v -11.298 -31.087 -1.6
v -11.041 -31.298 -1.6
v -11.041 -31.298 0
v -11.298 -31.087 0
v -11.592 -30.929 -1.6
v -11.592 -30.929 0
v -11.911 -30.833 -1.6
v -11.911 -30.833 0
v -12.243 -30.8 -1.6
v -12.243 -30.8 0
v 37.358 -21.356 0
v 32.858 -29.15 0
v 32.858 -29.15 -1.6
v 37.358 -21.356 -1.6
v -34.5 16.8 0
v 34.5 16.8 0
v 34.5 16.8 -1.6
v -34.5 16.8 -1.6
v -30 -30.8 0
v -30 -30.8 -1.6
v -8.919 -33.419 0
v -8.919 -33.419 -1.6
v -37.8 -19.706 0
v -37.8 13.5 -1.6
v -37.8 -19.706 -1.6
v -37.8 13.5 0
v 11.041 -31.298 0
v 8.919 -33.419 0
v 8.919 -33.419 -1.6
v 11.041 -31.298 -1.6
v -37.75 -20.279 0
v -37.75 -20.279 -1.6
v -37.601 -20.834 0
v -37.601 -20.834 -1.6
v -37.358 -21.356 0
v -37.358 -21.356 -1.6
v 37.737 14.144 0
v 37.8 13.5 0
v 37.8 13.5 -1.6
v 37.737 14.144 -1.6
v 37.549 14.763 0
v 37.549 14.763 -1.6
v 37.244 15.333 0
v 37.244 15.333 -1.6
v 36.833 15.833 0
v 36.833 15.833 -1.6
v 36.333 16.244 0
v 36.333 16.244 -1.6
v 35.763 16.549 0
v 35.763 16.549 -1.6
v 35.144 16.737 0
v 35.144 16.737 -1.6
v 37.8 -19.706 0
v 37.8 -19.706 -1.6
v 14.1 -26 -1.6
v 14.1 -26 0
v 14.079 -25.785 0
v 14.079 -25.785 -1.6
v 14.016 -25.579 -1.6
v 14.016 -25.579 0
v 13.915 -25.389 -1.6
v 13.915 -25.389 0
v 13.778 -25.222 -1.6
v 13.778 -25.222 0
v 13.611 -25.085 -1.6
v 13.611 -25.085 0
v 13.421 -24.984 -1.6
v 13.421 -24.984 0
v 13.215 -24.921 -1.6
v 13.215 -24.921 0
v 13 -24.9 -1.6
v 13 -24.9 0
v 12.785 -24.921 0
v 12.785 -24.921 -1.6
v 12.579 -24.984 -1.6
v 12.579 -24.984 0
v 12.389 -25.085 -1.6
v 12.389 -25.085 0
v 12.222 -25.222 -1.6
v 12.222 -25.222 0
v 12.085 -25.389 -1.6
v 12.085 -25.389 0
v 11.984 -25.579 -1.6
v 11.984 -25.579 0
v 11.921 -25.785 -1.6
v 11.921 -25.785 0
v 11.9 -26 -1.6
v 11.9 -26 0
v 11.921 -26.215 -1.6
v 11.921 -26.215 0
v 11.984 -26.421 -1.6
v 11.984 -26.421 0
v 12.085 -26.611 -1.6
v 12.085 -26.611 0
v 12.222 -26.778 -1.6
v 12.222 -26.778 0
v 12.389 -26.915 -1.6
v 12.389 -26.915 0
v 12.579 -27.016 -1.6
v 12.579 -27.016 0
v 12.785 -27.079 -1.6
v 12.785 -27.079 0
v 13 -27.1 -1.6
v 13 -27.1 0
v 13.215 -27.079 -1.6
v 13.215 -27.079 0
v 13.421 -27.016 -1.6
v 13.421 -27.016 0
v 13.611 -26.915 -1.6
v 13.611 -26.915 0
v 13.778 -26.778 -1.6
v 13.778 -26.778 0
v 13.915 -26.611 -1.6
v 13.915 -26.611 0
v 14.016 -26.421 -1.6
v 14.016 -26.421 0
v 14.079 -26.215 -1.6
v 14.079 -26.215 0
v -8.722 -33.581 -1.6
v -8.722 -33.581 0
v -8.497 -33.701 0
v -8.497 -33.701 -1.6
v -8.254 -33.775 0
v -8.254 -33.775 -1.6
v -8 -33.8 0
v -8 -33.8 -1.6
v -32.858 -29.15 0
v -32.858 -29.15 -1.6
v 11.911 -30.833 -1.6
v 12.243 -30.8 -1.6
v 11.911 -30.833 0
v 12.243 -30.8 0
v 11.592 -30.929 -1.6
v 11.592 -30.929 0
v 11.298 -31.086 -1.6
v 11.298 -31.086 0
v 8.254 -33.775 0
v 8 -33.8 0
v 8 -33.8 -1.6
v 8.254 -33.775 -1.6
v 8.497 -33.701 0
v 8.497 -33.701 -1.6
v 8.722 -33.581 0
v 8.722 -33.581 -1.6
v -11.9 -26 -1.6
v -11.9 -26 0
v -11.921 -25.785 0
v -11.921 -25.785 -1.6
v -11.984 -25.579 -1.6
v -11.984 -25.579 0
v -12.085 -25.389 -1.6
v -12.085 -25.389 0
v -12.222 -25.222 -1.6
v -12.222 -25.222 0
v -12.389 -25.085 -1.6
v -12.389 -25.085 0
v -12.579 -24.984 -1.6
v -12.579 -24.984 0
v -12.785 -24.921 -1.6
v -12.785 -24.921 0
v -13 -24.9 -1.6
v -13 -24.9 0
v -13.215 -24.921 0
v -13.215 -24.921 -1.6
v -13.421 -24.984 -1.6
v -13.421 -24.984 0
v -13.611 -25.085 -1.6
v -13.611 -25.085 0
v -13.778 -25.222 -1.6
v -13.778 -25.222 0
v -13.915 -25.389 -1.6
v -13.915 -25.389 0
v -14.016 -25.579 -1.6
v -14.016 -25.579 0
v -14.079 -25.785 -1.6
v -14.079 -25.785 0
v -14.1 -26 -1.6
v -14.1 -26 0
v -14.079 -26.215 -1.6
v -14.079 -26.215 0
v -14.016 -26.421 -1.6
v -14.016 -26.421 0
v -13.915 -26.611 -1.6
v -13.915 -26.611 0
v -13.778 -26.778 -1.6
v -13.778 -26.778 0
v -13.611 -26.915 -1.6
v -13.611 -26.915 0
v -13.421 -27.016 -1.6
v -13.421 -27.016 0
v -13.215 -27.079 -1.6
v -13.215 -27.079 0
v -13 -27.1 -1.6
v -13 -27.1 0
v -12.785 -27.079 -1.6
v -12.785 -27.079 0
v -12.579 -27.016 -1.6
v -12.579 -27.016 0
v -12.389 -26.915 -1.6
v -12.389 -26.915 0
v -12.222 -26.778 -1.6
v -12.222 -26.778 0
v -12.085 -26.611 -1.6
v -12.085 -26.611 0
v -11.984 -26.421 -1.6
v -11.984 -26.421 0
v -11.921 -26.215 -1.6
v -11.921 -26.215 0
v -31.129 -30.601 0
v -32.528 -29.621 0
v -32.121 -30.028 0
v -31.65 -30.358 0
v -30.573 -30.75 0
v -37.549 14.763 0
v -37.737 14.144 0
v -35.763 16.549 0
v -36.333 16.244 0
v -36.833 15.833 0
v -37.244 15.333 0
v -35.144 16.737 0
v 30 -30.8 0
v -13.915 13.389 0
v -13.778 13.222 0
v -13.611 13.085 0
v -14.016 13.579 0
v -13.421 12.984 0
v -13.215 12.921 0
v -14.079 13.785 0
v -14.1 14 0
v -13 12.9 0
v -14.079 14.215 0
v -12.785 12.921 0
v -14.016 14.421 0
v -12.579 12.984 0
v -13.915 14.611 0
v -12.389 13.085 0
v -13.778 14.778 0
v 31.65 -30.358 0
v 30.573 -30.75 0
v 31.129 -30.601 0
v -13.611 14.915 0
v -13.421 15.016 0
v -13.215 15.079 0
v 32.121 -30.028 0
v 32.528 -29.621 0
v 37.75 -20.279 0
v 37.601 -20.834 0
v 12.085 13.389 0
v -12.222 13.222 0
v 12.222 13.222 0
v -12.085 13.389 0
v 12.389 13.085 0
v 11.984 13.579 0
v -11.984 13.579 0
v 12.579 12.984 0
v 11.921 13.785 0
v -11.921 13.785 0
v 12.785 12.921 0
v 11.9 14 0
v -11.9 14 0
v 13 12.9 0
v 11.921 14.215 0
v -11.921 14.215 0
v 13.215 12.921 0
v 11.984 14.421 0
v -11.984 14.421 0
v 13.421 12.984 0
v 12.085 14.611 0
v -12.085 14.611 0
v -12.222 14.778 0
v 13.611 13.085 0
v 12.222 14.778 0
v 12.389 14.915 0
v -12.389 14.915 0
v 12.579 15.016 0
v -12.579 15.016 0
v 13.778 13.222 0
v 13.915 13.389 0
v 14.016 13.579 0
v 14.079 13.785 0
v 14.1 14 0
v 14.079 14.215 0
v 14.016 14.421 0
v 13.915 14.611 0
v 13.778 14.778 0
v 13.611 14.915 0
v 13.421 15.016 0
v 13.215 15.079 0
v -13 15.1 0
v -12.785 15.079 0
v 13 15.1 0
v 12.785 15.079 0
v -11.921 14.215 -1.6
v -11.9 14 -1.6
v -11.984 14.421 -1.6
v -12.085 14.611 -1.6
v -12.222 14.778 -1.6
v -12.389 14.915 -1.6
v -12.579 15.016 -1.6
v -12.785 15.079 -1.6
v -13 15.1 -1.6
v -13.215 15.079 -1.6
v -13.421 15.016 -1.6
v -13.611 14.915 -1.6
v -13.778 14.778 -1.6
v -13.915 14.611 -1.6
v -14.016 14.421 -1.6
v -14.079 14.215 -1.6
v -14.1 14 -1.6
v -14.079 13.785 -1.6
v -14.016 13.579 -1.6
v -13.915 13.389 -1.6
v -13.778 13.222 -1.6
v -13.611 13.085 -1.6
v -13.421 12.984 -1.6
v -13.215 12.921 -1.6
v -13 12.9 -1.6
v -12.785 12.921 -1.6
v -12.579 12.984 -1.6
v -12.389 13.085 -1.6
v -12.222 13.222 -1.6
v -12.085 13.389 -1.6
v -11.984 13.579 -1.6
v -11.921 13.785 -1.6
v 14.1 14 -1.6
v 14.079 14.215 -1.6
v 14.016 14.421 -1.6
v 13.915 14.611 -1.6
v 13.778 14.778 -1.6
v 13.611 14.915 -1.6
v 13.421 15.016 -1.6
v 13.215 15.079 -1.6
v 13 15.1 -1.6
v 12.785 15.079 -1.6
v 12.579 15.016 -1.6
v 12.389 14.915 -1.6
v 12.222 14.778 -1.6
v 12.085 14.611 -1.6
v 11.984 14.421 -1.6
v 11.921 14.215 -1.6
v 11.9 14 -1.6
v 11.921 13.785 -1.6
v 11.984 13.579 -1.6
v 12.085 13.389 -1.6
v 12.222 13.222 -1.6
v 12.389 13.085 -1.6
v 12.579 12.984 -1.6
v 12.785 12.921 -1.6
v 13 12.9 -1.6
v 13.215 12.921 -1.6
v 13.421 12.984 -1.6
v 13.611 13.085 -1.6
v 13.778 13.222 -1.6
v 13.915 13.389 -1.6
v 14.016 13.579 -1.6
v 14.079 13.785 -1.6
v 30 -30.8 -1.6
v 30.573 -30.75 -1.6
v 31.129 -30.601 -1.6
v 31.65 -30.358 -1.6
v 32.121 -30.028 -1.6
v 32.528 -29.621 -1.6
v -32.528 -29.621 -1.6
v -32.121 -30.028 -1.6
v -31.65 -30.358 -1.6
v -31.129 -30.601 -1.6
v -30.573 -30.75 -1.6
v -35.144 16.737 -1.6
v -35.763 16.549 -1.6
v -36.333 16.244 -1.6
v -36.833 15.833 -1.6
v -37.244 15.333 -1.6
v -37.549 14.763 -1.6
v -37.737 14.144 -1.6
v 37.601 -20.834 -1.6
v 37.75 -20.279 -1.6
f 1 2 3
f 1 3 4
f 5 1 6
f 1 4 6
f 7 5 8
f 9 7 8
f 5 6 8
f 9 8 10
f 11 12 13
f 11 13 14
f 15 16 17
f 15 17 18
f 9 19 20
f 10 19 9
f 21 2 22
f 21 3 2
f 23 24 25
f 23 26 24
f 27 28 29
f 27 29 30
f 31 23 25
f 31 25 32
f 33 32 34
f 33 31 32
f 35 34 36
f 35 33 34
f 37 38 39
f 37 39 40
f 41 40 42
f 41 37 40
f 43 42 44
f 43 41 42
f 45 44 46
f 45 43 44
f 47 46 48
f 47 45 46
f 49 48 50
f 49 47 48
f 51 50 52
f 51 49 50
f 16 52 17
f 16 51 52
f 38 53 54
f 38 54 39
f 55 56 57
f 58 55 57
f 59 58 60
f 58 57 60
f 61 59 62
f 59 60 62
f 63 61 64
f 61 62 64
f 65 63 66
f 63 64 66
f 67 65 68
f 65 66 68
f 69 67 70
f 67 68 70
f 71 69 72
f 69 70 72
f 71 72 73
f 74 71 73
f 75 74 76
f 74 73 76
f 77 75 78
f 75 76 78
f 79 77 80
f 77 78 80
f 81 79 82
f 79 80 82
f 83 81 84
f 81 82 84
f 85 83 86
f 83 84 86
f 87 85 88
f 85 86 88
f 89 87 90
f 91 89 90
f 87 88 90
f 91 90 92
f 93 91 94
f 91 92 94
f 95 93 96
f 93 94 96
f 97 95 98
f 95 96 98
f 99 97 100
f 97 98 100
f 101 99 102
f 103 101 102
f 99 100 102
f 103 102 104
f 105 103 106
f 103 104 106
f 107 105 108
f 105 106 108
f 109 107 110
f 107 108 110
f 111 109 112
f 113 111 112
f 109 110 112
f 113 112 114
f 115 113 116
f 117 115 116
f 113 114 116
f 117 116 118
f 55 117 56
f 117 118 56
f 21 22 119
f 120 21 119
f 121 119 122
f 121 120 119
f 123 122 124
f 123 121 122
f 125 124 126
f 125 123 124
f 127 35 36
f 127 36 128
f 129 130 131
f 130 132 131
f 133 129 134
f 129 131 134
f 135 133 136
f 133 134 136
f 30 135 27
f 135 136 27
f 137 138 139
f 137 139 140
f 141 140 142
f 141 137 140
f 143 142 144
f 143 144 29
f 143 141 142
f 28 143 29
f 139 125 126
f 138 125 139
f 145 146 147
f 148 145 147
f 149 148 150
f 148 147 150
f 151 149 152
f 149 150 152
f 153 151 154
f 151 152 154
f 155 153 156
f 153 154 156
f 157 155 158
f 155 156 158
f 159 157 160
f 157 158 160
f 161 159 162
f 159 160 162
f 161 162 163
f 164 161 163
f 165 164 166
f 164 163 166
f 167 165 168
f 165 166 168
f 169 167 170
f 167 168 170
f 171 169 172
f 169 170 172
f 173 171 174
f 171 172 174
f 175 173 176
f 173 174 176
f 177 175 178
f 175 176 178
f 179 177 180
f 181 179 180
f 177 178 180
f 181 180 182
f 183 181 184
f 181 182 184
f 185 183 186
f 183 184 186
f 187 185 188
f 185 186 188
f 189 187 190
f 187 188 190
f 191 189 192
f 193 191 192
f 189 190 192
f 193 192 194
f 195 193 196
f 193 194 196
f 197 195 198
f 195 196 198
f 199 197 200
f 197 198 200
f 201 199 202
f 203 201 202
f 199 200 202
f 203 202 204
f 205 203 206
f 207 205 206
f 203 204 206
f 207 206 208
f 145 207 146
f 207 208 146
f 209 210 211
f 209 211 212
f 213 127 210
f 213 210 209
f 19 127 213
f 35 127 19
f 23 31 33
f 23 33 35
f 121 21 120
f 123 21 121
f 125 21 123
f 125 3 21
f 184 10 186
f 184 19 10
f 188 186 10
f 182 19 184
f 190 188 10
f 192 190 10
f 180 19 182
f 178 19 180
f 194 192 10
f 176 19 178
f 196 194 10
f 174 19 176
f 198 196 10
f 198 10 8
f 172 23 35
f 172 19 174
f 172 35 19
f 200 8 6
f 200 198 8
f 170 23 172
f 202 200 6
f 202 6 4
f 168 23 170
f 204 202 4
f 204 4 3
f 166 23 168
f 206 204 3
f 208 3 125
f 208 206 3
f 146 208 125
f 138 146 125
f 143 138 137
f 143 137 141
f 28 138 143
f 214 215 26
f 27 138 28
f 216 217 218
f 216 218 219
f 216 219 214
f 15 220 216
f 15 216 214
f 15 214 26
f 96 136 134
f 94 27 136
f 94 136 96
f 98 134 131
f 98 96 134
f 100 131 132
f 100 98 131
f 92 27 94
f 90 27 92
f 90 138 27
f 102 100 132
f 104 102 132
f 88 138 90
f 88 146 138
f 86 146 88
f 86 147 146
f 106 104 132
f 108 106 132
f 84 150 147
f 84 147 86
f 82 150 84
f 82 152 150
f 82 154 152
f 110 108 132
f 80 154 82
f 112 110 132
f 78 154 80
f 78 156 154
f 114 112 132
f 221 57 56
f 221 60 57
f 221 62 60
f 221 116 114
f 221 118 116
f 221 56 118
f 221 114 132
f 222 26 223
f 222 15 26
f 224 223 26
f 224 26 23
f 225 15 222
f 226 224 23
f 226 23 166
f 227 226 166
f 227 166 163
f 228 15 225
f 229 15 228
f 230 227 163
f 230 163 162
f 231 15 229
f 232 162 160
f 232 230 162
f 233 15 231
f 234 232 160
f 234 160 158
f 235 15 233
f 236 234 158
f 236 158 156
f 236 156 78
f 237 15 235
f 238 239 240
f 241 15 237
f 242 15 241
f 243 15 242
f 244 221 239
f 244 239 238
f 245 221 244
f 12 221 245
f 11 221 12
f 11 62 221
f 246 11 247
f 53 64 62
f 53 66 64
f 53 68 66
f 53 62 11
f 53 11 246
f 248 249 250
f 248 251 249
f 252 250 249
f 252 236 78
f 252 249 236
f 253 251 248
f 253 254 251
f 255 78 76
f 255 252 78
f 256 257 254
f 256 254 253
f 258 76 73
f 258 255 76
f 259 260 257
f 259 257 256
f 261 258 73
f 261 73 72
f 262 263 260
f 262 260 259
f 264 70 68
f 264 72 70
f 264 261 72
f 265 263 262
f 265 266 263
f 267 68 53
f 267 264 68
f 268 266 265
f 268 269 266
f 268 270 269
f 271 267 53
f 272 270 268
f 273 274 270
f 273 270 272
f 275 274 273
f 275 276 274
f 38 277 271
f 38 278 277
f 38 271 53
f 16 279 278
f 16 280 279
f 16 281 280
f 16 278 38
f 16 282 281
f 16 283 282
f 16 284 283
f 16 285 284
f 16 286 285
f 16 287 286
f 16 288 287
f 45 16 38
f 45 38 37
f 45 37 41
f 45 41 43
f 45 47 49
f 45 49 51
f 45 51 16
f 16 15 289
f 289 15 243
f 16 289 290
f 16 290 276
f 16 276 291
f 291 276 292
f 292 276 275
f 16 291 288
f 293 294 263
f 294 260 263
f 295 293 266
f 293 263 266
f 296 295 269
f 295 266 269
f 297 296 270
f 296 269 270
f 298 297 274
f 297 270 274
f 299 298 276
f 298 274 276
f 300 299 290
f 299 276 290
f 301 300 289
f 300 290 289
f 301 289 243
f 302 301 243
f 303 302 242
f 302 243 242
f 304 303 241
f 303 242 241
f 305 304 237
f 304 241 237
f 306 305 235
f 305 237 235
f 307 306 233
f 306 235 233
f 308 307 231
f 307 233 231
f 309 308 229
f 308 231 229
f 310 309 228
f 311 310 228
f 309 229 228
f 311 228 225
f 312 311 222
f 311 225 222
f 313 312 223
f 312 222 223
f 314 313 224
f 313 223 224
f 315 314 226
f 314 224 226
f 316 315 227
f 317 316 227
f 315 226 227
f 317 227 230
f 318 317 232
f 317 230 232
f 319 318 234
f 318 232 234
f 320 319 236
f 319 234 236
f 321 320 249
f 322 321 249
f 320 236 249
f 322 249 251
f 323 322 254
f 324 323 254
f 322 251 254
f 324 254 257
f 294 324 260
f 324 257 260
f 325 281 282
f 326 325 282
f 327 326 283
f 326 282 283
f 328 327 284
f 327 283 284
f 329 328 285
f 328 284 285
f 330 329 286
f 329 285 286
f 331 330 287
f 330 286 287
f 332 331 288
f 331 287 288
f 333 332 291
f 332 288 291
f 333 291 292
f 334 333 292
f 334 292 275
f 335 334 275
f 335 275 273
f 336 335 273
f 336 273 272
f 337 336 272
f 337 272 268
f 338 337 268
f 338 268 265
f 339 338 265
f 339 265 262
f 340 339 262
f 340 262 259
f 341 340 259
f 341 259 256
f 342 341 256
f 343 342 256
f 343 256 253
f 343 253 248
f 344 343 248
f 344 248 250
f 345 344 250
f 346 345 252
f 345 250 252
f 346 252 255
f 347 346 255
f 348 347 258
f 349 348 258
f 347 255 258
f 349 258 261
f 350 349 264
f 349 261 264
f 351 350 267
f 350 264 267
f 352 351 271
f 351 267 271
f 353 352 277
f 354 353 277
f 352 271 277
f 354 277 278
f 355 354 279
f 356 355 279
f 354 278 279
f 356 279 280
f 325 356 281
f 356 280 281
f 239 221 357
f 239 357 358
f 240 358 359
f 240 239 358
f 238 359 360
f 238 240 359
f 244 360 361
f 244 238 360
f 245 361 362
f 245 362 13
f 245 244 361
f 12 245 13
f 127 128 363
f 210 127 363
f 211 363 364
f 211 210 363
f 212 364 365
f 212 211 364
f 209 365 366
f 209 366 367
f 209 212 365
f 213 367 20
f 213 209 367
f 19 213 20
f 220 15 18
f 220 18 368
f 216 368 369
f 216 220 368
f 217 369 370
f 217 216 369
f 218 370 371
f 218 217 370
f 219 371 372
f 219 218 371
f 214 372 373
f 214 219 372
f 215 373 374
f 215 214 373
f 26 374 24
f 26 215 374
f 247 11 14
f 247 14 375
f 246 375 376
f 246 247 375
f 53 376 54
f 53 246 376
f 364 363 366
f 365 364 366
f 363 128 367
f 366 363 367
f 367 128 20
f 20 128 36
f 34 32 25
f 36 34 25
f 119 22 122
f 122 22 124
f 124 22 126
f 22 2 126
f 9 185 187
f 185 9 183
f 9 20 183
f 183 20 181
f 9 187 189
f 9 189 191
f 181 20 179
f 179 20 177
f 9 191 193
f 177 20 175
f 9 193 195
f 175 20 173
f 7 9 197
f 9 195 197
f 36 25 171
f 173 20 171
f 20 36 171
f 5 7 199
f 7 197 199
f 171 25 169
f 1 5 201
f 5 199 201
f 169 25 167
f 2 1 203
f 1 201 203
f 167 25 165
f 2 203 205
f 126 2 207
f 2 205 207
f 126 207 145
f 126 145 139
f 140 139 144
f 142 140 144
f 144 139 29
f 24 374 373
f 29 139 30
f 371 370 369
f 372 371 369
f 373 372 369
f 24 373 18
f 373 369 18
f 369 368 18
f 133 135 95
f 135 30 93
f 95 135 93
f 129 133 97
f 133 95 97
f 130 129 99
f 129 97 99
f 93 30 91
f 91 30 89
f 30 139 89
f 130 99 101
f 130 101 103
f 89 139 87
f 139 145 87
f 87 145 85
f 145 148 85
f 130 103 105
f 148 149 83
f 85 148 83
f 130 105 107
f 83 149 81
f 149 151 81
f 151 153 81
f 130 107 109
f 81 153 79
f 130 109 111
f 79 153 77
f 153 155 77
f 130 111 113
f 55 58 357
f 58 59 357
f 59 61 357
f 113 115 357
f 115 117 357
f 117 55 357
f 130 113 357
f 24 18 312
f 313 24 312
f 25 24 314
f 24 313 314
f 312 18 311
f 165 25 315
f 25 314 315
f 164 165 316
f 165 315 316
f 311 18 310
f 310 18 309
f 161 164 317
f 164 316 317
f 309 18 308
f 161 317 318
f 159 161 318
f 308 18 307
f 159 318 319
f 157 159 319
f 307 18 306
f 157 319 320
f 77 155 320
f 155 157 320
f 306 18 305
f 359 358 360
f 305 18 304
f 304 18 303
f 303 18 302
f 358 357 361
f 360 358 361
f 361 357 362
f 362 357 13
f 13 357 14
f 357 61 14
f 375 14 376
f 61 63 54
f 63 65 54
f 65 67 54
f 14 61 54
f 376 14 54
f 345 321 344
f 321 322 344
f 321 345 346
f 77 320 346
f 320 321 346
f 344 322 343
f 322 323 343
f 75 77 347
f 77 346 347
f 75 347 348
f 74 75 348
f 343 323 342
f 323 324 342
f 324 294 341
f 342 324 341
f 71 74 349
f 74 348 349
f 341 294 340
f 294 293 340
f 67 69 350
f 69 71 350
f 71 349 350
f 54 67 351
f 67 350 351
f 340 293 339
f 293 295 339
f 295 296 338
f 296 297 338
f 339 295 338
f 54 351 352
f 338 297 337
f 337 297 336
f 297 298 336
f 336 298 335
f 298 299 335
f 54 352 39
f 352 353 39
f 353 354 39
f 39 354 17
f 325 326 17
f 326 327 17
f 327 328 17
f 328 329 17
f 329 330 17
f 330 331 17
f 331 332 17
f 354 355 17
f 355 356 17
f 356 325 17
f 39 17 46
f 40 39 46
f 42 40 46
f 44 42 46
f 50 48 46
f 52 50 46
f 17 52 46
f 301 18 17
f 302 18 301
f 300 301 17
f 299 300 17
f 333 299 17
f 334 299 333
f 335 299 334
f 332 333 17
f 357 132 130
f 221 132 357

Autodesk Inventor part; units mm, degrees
ref_plane "YZ Plane" through (0, 0, 0) normal (1, 0, 0) x (0, 1, 0)
ref_plane "XZ Plane" through (0, 0, 0) normal (0, 1, 0) x (-1, 0, 0)
ref_plane "XY Plane" through (0, 0, 0) normal (0, 0, 1) x (1, 0, 0)
sketch "スケッチ1" plane through (0, 0, 0) normal (0, 0, 1) x (1, 0, 0)
  line L0 (8, -34) -> (-8, -34) construction
  arc A0 (-9.0607, -33.5607) -> (-8, -34) centre (-8, -32.5) ccw construction
  line L1 (-11.182, -31.4393) -> (-9.0607, -33.5607) construction
  arc A1 (-11.182, -31.4393) -> (-12.2426, -31) centre (-12.2426, -32.5) ccw construction
  line L2 (-30, -31) -> (-12.2426, -31) construction
  arc A2 (-33.0311, -29.25) -> (-30, -31) centre (-30, -27.5) ccw construction
  line L3 (-37.5311, -21.4558) -> (-33.0311, -29.25) construction
  arc A3 (-38, -19.7058) -> (-37.5311, -21.4558) centre (-34.5, -19.7058) ccw construction
  line L4 (-38, 13.5) -> (-38, -19.7058) construction
  arc A4 (-34.5, 17) -> (-38, 13.5) centre (-34.5, 13.5) ccw construction
  line L5 (34.5, 17) -> (-34.5, 17) construction
  arc A5 (38, 13.5) -> (34.5, 17) centre (34.5, 13.5) ccw construction
  line L6 (38, 13.5) -> (38, -19.7058) construction
  arc A6 (37.5311, -21.4558) -> (38, -19.7058) centre (34.5, -19.7058) ccw construction
  line L7 (37.5311, -21.4558) -> (33.0311, -29.25) construction
  arc A7 (30, -31) -> (33.0311, -29.25) centre (30, -27.5) ccw construction
  line L8 (30, -31) -> (12.2426, -31) construction
  arc A8 (12.2426, -31) -> (11.182, -31.4393) centre (12.2426, -32.5) ccw construction
  line L9 (11.182, -31.4393) -> (9.0607, -33.5607) construction
  arc A9 (8, -34) -> (9.0607, -33.5607) centre (8, -32.5) ccw construction
  line L10 (32.8579, -29.15) -> (37.3579, -21.3558)
  arc A10 (37.3579, -21.3558) -> (37.8, -19.7058) centre (34.5, -19.7058) ccw
  line L11 (37.8, -19.7058) -> (37.8, 13.5)
  arc A11 (37.8, 13.5) -> (34.5, 16.8) centre (34.5, 13.5) ccw
  line L12 (34.5, 16.8) -> (-34.5, 16.8)
  arc A12 (-34.5, 16.8) -> (-37.8, 13.5) centre (-34.5, 13.5) ccw
  line L13 (-37.8, 13.5) -> (-37.8, -19.7058)
  arc A13 (-37.8, -19.7058) -> (-37.3579, -21.3558) centre (-34.5, -19.7058) ccw
  line L14 (-37.3579, -21.3558) -> (-32.8579, -29.15)
  arc A14 (-32.8579, -29.15) -> (-30, -30.8) centre (-30, -27.5) ccw
  line L15 (-30, -30.8) -> (-12.2426, -30.8)
  arc A15 (-11.0406, -31.2979) -> (-12.2426, -30.8) centre (-12.2426, -32.5) ccw
  line L16 (-11.0406, -31.2979) -> (-8.9192, -33.4192)
  arc A16 (-8.9192, -33.4192) -> (-8, -33.8) centre (-8, -32.5) ccw
  line L17 (-8, -33.8) -> (8, -33.8)
  arc A17 (8, -33.8) -> (8.9192, -33.4192) centre (8, -32.5) ccw
  line L18 (8.9192, -33.4192) -> (11.0406, -31.2979)
  arc A18 (12.2426, -30.8) -> (11.0406, -31.2979) centre (12.2426, -32.5) ccw
  line L19 (12.2426, -30.8) -> (30, -30.8)
  arc A19 (30, -30.8) -> (32.8579, -29.15) centre (30, -27.5) ccw
  circle A20 centre (-13, -26) radius 1.1
  circle A21 centre (-13, 14) radius 1.1
  arc A22 (-13, -23) -> (-16, -26) centre (-13, -26) ccw construction
  arc A23 (-16, 14) -> (-13, 11) centre (-13, 14) ccw construction
  line L20 (0, 0) -> (0, -37.0919) construction
  circle A24 centre (13, -26) radius 1.1
  circle A25 centre (13, 14) radius 1.1
  dimension "d28" = 0.2
  dimension "d29" = 2.2
extrude "押し出し1" add sketch "スケッチ1" against normal blind 1.6
properties part number "main_pcb" material "GFRC"
